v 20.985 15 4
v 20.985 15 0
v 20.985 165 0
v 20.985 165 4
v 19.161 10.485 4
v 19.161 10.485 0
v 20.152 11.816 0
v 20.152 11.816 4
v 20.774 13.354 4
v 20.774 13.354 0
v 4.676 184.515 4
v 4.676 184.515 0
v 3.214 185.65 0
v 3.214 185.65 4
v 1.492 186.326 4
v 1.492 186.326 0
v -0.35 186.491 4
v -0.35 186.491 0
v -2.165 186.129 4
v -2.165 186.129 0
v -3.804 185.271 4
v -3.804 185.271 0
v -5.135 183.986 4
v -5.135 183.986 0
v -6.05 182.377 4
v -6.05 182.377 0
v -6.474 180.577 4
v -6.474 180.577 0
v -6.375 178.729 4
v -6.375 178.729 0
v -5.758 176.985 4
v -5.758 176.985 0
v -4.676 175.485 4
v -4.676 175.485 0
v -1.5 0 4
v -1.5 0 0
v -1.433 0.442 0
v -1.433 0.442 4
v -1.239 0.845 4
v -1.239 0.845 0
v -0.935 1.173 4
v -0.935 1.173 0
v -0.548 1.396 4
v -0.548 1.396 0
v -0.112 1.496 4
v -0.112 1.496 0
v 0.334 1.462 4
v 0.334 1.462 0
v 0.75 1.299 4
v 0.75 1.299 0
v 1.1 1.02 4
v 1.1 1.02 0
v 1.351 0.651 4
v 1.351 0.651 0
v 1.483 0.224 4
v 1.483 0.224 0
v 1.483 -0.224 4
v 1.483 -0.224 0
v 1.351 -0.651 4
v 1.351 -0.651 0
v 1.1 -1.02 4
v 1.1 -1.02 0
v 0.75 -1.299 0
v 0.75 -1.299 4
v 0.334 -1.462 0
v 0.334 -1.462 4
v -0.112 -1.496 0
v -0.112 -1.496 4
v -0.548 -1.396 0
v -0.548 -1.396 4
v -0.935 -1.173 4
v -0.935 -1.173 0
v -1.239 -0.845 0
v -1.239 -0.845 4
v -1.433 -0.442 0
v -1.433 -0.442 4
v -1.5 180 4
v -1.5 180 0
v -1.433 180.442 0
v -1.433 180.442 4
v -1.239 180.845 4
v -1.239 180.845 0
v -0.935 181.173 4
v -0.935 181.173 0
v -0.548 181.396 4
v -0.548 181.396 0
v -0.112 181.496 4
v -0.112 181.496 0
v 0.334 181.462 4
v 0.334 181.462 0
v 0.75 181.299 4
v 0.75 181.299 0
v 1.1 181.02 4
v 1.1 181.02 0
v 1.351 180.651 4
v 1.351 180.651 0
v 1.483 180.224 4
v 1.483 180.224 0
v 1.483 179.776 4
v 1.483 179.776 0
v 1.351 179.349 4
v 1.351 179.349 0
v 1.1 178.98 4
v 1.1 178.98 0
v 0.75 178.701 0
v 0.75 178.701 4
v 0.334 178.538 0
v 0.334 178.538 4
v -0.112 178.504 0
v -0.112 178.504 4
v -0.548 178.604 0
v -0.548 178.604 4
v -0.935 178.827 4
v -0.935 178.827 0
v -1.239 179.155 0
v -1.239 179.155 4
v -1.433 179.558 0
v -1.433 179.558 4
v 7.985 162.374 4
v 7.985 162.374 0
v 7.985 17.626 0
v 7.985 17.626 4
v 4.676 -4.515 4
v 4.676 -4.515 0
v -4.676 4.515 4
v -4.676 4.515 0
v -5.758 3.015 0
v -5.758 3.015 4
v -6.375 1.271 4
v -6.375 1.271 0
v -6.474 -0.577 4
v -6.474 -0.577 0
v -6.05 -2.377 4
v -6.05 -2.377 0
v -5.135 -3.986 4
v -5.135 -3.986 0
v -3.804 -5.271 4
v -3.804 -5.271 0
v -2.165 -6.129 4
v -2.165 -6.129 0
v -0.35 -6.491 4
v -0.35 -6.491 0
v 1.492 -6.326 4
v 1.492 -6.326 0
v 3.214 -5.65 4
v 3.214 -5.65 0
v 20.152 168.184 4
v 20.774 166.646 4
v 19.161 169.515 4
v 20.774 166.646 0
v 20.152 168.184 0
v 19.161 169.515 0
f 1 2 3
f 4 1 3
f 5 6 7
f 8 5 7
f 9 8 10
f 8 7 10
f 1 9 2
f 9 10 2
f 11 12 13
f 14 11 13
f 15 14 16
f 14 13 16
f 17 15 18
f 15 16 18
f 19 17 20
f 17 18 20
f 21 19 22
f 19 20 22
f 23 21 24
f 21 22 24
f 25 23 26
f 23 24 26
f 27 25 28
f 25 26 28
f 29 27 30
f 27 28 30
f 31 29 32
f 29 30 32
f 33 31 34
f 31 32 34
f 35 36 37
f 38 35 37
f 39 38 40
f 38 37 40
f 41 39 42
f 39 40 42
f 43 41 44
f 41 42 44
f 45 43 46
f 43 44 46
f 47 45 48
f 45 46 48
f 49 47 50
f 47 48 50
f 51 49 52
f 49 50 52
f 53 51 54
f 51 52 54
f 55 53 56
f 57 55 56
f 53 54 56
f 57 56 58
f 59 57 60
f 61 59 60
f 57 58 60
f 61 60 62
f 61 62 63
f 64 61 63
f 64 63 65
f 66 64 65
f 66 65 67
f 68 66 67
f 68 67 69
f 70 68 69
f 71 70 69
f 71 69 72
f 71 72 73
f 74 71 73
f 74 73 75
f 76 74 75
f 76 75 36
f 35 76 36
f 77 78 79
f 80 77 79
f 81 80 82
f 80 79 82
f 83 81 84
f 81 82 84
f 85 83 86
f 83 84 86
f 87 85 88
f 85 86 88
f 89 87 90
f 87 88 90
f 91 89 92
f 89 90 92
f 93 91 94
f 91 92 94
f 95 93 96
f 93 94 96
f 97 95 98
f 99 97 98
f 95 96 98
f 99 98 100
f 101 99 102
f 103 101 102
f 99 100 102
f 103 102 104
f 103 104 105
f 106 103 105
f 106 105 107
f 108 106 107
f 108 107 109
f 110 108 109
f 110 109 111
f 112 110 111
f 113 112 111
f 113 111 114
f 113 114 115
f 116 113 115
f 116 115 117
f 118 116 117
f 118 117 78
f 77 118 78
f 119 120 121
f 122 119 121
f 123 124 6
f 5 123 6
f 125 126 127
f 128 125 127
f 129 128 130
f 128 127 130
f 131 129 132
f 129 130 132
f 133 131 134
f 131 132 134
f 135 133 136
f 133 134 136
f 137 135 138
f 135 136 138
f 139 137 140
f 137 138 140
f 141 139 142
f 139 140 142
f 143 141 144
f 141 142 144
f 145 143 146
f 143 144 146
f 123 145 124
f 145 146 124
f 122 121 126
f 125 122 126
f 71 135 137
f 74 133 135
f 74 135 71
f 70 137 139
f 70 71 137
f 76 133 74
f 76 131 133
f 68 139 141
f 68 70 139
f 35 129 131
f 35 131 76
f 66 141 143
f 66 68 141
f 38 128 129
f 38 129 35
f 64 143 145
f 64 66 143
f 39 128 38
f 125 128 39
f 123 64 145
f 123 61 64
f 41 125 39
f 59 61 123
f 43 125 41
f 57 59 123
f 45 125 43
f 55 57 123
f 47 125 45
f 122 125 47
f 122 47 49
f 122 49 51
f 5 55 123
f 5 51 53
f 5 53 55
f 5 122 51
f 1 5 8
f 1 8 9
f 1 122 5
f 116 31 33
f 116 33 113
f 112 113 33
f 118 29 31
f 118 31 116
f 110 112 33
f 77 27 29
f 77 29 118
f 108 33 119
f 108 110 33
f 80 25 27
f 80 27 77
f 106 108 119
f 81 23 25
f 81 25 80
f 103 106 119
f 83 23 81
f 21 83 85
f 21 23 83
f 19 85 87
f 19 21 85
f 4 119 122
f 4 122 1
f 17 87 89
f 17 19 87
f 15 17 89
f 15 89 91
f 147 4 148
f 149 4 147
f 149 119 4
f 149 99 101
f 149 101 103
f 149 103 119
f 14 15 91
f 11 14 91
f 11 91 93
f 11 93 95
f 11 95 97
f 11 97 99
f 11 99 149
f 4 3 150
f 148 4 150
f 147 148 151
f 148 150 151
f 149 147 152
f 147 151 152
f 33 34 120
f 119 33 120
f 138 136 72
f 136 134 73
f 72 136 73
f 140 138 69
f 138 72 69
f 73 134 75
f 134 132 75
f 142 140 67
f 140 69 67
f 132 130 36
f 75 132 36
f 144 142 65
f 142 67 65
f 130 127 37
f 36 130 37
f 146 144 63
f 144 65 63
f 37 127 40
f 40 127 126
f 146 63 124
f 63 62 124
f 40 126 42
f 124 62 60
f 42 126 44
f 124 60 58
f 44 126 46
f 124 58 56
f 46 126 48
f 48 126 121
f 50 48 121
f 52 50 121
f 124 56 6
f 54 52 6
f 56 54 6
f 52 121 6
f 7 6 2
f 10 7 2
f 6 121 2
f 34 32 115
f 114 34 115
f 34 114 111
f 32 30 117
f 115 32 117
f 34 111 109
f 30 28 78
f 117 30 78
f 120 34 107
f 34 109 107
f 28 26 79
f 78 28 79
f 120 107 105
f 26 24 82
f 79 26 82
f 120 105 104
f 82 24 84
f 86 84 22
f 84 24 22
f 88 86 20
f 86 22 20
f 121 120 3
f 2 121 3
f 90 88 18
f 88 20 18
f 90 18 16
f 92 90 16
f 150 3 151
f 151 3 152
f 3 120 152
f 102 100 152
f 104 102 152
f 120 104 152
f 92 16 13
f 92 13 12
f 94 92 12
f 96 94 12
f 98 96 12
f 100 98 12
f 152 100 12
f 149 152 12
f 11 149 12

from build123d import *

# Parameters (mm, degrees)
EXTRUDE_1_DEPTH        = 4
HOLE_WIZARD_M3_1_D     = 3
HOLE_WIZARD_M3_1_DEPTH = 10
HOLE_WIZARD_M3_1_TIP   = 0.901290929


with BuildPart() as part:
    # 草图1 → 凸台-拉伸1 (new body)
    with BuildSketch(Plane.XY):
        with BuildLine():
            Line((7.985331622, 162.373829532), (7.985331622, 17.626170468))
            Line((7.985331622, 17.626170468), (9.80962292, 19.515279408))
            ThreePointArc((9.80962292, 19.515279408), (16.920274479, 21.026695055), (20.985331622, 15))
            Line((20.985331622, 15), (20.985331622, 165))
            ThreePointArc((20.985331622, 165), (16.920274479, 158.973304945), (9.80962292, 160.484720592))
            Line((9.80962292, 160.484720592), (7.985331622, 162.373829532))
        make_face()
        with BuildLine():
            Line((-4.675708702, 175.484720592), (7.985331622, 162.373829532))
            Line((7.985331622, 162.373829532), (7.985331622, 165))
            ThreePointArc((7.985331622, 165), (12.050388765, 171.026695055), (19.161040324, 169.515279408))
            Line((19.161040324, 169.515279408), (4.675708702, 184.515279408))
            ThreePointArc((4.675708702, 184.515279408), (-4.515279408, 184.675708702), (-4.675708702, 175.484720592))
        make_face()
        with BuildLine():
            Line((7.985331622, 165), (7.985331622, 162.373829532))
            Line((7.985331622, 162.373829532), (9.80962292, 160.484720592))
            ThreePointArc((9.80962292, 160.484720592), (16.920274479, 158.973304945), (20.985331622, 165))
            ThreePointArc((20.985331622, 165), (20.512026677, 167.434942857), (19.161040324, 169.515279408))
            ThreePointArc((19.161040324, 169.515279408), (12.050388765, 171.026695055), (7.985331622, 165))
        make_face()
        with BuildLine():
            Line((9.80962292, 19.515279408), (7.985331622, 17.626170468))
            Line((7.985331622, 17.626170468), (7.985331622, 15))
            ThreePointArc((7.985331622, 15), (12.050388765, 8.973304945), (19.161040324, 10.484720592))
            ThreePointArc((19.161040324, 10.484720592), (20.512026677, 12.565057143), (20.985331622, 15))
            ThreePointArc((20.985331622, 15), (16.920274479, 21.026695055), (9.80962292, 19.515279408))
        make_face()
        with BuildLine():
            Line((7.985331622, 17.626170468), (-4.675708702, 4.515279408))
            ThreePointArc((-4.675708702, 4.515279408), (-4.515279408, -4.675708702), (4.675708702, -4.515279408))
            Line((4.675708702, -4.515279408), (19.161040324, 10.484720592))
            ThreePointArc((19.161040324, 10.484720592), (12.050388765, 8.973304945), (7.985331622, 15))
            Line((7.985331622, 15), (7.985331622, 17.626170468))
        make_face()
    extrude(amount=EXTRUDE_1_DEPTH)

    # M3 螺纹孔1
    with Locations(Plane.XY.offset(4)):
        with Locations((0, 0), (0, 180)):
            Hole(HOLE_WIZARD_M3_1_D / 2, depth=HOLE_WIZARD_M3_1_DEPTH)
            with Locations((0, 0, -(HOLE_WIZARD_M3_1_DEPTH + HOLE_WIZARD_M3_1_TIP / 2))):  # 118° drill point
                Cone(0, HOLE_WIZARD_M3_1_D / 2, HOLE_WIZARD_M3_1_TIP, mode=Mode.SUBTRACT)


solid = part.part
